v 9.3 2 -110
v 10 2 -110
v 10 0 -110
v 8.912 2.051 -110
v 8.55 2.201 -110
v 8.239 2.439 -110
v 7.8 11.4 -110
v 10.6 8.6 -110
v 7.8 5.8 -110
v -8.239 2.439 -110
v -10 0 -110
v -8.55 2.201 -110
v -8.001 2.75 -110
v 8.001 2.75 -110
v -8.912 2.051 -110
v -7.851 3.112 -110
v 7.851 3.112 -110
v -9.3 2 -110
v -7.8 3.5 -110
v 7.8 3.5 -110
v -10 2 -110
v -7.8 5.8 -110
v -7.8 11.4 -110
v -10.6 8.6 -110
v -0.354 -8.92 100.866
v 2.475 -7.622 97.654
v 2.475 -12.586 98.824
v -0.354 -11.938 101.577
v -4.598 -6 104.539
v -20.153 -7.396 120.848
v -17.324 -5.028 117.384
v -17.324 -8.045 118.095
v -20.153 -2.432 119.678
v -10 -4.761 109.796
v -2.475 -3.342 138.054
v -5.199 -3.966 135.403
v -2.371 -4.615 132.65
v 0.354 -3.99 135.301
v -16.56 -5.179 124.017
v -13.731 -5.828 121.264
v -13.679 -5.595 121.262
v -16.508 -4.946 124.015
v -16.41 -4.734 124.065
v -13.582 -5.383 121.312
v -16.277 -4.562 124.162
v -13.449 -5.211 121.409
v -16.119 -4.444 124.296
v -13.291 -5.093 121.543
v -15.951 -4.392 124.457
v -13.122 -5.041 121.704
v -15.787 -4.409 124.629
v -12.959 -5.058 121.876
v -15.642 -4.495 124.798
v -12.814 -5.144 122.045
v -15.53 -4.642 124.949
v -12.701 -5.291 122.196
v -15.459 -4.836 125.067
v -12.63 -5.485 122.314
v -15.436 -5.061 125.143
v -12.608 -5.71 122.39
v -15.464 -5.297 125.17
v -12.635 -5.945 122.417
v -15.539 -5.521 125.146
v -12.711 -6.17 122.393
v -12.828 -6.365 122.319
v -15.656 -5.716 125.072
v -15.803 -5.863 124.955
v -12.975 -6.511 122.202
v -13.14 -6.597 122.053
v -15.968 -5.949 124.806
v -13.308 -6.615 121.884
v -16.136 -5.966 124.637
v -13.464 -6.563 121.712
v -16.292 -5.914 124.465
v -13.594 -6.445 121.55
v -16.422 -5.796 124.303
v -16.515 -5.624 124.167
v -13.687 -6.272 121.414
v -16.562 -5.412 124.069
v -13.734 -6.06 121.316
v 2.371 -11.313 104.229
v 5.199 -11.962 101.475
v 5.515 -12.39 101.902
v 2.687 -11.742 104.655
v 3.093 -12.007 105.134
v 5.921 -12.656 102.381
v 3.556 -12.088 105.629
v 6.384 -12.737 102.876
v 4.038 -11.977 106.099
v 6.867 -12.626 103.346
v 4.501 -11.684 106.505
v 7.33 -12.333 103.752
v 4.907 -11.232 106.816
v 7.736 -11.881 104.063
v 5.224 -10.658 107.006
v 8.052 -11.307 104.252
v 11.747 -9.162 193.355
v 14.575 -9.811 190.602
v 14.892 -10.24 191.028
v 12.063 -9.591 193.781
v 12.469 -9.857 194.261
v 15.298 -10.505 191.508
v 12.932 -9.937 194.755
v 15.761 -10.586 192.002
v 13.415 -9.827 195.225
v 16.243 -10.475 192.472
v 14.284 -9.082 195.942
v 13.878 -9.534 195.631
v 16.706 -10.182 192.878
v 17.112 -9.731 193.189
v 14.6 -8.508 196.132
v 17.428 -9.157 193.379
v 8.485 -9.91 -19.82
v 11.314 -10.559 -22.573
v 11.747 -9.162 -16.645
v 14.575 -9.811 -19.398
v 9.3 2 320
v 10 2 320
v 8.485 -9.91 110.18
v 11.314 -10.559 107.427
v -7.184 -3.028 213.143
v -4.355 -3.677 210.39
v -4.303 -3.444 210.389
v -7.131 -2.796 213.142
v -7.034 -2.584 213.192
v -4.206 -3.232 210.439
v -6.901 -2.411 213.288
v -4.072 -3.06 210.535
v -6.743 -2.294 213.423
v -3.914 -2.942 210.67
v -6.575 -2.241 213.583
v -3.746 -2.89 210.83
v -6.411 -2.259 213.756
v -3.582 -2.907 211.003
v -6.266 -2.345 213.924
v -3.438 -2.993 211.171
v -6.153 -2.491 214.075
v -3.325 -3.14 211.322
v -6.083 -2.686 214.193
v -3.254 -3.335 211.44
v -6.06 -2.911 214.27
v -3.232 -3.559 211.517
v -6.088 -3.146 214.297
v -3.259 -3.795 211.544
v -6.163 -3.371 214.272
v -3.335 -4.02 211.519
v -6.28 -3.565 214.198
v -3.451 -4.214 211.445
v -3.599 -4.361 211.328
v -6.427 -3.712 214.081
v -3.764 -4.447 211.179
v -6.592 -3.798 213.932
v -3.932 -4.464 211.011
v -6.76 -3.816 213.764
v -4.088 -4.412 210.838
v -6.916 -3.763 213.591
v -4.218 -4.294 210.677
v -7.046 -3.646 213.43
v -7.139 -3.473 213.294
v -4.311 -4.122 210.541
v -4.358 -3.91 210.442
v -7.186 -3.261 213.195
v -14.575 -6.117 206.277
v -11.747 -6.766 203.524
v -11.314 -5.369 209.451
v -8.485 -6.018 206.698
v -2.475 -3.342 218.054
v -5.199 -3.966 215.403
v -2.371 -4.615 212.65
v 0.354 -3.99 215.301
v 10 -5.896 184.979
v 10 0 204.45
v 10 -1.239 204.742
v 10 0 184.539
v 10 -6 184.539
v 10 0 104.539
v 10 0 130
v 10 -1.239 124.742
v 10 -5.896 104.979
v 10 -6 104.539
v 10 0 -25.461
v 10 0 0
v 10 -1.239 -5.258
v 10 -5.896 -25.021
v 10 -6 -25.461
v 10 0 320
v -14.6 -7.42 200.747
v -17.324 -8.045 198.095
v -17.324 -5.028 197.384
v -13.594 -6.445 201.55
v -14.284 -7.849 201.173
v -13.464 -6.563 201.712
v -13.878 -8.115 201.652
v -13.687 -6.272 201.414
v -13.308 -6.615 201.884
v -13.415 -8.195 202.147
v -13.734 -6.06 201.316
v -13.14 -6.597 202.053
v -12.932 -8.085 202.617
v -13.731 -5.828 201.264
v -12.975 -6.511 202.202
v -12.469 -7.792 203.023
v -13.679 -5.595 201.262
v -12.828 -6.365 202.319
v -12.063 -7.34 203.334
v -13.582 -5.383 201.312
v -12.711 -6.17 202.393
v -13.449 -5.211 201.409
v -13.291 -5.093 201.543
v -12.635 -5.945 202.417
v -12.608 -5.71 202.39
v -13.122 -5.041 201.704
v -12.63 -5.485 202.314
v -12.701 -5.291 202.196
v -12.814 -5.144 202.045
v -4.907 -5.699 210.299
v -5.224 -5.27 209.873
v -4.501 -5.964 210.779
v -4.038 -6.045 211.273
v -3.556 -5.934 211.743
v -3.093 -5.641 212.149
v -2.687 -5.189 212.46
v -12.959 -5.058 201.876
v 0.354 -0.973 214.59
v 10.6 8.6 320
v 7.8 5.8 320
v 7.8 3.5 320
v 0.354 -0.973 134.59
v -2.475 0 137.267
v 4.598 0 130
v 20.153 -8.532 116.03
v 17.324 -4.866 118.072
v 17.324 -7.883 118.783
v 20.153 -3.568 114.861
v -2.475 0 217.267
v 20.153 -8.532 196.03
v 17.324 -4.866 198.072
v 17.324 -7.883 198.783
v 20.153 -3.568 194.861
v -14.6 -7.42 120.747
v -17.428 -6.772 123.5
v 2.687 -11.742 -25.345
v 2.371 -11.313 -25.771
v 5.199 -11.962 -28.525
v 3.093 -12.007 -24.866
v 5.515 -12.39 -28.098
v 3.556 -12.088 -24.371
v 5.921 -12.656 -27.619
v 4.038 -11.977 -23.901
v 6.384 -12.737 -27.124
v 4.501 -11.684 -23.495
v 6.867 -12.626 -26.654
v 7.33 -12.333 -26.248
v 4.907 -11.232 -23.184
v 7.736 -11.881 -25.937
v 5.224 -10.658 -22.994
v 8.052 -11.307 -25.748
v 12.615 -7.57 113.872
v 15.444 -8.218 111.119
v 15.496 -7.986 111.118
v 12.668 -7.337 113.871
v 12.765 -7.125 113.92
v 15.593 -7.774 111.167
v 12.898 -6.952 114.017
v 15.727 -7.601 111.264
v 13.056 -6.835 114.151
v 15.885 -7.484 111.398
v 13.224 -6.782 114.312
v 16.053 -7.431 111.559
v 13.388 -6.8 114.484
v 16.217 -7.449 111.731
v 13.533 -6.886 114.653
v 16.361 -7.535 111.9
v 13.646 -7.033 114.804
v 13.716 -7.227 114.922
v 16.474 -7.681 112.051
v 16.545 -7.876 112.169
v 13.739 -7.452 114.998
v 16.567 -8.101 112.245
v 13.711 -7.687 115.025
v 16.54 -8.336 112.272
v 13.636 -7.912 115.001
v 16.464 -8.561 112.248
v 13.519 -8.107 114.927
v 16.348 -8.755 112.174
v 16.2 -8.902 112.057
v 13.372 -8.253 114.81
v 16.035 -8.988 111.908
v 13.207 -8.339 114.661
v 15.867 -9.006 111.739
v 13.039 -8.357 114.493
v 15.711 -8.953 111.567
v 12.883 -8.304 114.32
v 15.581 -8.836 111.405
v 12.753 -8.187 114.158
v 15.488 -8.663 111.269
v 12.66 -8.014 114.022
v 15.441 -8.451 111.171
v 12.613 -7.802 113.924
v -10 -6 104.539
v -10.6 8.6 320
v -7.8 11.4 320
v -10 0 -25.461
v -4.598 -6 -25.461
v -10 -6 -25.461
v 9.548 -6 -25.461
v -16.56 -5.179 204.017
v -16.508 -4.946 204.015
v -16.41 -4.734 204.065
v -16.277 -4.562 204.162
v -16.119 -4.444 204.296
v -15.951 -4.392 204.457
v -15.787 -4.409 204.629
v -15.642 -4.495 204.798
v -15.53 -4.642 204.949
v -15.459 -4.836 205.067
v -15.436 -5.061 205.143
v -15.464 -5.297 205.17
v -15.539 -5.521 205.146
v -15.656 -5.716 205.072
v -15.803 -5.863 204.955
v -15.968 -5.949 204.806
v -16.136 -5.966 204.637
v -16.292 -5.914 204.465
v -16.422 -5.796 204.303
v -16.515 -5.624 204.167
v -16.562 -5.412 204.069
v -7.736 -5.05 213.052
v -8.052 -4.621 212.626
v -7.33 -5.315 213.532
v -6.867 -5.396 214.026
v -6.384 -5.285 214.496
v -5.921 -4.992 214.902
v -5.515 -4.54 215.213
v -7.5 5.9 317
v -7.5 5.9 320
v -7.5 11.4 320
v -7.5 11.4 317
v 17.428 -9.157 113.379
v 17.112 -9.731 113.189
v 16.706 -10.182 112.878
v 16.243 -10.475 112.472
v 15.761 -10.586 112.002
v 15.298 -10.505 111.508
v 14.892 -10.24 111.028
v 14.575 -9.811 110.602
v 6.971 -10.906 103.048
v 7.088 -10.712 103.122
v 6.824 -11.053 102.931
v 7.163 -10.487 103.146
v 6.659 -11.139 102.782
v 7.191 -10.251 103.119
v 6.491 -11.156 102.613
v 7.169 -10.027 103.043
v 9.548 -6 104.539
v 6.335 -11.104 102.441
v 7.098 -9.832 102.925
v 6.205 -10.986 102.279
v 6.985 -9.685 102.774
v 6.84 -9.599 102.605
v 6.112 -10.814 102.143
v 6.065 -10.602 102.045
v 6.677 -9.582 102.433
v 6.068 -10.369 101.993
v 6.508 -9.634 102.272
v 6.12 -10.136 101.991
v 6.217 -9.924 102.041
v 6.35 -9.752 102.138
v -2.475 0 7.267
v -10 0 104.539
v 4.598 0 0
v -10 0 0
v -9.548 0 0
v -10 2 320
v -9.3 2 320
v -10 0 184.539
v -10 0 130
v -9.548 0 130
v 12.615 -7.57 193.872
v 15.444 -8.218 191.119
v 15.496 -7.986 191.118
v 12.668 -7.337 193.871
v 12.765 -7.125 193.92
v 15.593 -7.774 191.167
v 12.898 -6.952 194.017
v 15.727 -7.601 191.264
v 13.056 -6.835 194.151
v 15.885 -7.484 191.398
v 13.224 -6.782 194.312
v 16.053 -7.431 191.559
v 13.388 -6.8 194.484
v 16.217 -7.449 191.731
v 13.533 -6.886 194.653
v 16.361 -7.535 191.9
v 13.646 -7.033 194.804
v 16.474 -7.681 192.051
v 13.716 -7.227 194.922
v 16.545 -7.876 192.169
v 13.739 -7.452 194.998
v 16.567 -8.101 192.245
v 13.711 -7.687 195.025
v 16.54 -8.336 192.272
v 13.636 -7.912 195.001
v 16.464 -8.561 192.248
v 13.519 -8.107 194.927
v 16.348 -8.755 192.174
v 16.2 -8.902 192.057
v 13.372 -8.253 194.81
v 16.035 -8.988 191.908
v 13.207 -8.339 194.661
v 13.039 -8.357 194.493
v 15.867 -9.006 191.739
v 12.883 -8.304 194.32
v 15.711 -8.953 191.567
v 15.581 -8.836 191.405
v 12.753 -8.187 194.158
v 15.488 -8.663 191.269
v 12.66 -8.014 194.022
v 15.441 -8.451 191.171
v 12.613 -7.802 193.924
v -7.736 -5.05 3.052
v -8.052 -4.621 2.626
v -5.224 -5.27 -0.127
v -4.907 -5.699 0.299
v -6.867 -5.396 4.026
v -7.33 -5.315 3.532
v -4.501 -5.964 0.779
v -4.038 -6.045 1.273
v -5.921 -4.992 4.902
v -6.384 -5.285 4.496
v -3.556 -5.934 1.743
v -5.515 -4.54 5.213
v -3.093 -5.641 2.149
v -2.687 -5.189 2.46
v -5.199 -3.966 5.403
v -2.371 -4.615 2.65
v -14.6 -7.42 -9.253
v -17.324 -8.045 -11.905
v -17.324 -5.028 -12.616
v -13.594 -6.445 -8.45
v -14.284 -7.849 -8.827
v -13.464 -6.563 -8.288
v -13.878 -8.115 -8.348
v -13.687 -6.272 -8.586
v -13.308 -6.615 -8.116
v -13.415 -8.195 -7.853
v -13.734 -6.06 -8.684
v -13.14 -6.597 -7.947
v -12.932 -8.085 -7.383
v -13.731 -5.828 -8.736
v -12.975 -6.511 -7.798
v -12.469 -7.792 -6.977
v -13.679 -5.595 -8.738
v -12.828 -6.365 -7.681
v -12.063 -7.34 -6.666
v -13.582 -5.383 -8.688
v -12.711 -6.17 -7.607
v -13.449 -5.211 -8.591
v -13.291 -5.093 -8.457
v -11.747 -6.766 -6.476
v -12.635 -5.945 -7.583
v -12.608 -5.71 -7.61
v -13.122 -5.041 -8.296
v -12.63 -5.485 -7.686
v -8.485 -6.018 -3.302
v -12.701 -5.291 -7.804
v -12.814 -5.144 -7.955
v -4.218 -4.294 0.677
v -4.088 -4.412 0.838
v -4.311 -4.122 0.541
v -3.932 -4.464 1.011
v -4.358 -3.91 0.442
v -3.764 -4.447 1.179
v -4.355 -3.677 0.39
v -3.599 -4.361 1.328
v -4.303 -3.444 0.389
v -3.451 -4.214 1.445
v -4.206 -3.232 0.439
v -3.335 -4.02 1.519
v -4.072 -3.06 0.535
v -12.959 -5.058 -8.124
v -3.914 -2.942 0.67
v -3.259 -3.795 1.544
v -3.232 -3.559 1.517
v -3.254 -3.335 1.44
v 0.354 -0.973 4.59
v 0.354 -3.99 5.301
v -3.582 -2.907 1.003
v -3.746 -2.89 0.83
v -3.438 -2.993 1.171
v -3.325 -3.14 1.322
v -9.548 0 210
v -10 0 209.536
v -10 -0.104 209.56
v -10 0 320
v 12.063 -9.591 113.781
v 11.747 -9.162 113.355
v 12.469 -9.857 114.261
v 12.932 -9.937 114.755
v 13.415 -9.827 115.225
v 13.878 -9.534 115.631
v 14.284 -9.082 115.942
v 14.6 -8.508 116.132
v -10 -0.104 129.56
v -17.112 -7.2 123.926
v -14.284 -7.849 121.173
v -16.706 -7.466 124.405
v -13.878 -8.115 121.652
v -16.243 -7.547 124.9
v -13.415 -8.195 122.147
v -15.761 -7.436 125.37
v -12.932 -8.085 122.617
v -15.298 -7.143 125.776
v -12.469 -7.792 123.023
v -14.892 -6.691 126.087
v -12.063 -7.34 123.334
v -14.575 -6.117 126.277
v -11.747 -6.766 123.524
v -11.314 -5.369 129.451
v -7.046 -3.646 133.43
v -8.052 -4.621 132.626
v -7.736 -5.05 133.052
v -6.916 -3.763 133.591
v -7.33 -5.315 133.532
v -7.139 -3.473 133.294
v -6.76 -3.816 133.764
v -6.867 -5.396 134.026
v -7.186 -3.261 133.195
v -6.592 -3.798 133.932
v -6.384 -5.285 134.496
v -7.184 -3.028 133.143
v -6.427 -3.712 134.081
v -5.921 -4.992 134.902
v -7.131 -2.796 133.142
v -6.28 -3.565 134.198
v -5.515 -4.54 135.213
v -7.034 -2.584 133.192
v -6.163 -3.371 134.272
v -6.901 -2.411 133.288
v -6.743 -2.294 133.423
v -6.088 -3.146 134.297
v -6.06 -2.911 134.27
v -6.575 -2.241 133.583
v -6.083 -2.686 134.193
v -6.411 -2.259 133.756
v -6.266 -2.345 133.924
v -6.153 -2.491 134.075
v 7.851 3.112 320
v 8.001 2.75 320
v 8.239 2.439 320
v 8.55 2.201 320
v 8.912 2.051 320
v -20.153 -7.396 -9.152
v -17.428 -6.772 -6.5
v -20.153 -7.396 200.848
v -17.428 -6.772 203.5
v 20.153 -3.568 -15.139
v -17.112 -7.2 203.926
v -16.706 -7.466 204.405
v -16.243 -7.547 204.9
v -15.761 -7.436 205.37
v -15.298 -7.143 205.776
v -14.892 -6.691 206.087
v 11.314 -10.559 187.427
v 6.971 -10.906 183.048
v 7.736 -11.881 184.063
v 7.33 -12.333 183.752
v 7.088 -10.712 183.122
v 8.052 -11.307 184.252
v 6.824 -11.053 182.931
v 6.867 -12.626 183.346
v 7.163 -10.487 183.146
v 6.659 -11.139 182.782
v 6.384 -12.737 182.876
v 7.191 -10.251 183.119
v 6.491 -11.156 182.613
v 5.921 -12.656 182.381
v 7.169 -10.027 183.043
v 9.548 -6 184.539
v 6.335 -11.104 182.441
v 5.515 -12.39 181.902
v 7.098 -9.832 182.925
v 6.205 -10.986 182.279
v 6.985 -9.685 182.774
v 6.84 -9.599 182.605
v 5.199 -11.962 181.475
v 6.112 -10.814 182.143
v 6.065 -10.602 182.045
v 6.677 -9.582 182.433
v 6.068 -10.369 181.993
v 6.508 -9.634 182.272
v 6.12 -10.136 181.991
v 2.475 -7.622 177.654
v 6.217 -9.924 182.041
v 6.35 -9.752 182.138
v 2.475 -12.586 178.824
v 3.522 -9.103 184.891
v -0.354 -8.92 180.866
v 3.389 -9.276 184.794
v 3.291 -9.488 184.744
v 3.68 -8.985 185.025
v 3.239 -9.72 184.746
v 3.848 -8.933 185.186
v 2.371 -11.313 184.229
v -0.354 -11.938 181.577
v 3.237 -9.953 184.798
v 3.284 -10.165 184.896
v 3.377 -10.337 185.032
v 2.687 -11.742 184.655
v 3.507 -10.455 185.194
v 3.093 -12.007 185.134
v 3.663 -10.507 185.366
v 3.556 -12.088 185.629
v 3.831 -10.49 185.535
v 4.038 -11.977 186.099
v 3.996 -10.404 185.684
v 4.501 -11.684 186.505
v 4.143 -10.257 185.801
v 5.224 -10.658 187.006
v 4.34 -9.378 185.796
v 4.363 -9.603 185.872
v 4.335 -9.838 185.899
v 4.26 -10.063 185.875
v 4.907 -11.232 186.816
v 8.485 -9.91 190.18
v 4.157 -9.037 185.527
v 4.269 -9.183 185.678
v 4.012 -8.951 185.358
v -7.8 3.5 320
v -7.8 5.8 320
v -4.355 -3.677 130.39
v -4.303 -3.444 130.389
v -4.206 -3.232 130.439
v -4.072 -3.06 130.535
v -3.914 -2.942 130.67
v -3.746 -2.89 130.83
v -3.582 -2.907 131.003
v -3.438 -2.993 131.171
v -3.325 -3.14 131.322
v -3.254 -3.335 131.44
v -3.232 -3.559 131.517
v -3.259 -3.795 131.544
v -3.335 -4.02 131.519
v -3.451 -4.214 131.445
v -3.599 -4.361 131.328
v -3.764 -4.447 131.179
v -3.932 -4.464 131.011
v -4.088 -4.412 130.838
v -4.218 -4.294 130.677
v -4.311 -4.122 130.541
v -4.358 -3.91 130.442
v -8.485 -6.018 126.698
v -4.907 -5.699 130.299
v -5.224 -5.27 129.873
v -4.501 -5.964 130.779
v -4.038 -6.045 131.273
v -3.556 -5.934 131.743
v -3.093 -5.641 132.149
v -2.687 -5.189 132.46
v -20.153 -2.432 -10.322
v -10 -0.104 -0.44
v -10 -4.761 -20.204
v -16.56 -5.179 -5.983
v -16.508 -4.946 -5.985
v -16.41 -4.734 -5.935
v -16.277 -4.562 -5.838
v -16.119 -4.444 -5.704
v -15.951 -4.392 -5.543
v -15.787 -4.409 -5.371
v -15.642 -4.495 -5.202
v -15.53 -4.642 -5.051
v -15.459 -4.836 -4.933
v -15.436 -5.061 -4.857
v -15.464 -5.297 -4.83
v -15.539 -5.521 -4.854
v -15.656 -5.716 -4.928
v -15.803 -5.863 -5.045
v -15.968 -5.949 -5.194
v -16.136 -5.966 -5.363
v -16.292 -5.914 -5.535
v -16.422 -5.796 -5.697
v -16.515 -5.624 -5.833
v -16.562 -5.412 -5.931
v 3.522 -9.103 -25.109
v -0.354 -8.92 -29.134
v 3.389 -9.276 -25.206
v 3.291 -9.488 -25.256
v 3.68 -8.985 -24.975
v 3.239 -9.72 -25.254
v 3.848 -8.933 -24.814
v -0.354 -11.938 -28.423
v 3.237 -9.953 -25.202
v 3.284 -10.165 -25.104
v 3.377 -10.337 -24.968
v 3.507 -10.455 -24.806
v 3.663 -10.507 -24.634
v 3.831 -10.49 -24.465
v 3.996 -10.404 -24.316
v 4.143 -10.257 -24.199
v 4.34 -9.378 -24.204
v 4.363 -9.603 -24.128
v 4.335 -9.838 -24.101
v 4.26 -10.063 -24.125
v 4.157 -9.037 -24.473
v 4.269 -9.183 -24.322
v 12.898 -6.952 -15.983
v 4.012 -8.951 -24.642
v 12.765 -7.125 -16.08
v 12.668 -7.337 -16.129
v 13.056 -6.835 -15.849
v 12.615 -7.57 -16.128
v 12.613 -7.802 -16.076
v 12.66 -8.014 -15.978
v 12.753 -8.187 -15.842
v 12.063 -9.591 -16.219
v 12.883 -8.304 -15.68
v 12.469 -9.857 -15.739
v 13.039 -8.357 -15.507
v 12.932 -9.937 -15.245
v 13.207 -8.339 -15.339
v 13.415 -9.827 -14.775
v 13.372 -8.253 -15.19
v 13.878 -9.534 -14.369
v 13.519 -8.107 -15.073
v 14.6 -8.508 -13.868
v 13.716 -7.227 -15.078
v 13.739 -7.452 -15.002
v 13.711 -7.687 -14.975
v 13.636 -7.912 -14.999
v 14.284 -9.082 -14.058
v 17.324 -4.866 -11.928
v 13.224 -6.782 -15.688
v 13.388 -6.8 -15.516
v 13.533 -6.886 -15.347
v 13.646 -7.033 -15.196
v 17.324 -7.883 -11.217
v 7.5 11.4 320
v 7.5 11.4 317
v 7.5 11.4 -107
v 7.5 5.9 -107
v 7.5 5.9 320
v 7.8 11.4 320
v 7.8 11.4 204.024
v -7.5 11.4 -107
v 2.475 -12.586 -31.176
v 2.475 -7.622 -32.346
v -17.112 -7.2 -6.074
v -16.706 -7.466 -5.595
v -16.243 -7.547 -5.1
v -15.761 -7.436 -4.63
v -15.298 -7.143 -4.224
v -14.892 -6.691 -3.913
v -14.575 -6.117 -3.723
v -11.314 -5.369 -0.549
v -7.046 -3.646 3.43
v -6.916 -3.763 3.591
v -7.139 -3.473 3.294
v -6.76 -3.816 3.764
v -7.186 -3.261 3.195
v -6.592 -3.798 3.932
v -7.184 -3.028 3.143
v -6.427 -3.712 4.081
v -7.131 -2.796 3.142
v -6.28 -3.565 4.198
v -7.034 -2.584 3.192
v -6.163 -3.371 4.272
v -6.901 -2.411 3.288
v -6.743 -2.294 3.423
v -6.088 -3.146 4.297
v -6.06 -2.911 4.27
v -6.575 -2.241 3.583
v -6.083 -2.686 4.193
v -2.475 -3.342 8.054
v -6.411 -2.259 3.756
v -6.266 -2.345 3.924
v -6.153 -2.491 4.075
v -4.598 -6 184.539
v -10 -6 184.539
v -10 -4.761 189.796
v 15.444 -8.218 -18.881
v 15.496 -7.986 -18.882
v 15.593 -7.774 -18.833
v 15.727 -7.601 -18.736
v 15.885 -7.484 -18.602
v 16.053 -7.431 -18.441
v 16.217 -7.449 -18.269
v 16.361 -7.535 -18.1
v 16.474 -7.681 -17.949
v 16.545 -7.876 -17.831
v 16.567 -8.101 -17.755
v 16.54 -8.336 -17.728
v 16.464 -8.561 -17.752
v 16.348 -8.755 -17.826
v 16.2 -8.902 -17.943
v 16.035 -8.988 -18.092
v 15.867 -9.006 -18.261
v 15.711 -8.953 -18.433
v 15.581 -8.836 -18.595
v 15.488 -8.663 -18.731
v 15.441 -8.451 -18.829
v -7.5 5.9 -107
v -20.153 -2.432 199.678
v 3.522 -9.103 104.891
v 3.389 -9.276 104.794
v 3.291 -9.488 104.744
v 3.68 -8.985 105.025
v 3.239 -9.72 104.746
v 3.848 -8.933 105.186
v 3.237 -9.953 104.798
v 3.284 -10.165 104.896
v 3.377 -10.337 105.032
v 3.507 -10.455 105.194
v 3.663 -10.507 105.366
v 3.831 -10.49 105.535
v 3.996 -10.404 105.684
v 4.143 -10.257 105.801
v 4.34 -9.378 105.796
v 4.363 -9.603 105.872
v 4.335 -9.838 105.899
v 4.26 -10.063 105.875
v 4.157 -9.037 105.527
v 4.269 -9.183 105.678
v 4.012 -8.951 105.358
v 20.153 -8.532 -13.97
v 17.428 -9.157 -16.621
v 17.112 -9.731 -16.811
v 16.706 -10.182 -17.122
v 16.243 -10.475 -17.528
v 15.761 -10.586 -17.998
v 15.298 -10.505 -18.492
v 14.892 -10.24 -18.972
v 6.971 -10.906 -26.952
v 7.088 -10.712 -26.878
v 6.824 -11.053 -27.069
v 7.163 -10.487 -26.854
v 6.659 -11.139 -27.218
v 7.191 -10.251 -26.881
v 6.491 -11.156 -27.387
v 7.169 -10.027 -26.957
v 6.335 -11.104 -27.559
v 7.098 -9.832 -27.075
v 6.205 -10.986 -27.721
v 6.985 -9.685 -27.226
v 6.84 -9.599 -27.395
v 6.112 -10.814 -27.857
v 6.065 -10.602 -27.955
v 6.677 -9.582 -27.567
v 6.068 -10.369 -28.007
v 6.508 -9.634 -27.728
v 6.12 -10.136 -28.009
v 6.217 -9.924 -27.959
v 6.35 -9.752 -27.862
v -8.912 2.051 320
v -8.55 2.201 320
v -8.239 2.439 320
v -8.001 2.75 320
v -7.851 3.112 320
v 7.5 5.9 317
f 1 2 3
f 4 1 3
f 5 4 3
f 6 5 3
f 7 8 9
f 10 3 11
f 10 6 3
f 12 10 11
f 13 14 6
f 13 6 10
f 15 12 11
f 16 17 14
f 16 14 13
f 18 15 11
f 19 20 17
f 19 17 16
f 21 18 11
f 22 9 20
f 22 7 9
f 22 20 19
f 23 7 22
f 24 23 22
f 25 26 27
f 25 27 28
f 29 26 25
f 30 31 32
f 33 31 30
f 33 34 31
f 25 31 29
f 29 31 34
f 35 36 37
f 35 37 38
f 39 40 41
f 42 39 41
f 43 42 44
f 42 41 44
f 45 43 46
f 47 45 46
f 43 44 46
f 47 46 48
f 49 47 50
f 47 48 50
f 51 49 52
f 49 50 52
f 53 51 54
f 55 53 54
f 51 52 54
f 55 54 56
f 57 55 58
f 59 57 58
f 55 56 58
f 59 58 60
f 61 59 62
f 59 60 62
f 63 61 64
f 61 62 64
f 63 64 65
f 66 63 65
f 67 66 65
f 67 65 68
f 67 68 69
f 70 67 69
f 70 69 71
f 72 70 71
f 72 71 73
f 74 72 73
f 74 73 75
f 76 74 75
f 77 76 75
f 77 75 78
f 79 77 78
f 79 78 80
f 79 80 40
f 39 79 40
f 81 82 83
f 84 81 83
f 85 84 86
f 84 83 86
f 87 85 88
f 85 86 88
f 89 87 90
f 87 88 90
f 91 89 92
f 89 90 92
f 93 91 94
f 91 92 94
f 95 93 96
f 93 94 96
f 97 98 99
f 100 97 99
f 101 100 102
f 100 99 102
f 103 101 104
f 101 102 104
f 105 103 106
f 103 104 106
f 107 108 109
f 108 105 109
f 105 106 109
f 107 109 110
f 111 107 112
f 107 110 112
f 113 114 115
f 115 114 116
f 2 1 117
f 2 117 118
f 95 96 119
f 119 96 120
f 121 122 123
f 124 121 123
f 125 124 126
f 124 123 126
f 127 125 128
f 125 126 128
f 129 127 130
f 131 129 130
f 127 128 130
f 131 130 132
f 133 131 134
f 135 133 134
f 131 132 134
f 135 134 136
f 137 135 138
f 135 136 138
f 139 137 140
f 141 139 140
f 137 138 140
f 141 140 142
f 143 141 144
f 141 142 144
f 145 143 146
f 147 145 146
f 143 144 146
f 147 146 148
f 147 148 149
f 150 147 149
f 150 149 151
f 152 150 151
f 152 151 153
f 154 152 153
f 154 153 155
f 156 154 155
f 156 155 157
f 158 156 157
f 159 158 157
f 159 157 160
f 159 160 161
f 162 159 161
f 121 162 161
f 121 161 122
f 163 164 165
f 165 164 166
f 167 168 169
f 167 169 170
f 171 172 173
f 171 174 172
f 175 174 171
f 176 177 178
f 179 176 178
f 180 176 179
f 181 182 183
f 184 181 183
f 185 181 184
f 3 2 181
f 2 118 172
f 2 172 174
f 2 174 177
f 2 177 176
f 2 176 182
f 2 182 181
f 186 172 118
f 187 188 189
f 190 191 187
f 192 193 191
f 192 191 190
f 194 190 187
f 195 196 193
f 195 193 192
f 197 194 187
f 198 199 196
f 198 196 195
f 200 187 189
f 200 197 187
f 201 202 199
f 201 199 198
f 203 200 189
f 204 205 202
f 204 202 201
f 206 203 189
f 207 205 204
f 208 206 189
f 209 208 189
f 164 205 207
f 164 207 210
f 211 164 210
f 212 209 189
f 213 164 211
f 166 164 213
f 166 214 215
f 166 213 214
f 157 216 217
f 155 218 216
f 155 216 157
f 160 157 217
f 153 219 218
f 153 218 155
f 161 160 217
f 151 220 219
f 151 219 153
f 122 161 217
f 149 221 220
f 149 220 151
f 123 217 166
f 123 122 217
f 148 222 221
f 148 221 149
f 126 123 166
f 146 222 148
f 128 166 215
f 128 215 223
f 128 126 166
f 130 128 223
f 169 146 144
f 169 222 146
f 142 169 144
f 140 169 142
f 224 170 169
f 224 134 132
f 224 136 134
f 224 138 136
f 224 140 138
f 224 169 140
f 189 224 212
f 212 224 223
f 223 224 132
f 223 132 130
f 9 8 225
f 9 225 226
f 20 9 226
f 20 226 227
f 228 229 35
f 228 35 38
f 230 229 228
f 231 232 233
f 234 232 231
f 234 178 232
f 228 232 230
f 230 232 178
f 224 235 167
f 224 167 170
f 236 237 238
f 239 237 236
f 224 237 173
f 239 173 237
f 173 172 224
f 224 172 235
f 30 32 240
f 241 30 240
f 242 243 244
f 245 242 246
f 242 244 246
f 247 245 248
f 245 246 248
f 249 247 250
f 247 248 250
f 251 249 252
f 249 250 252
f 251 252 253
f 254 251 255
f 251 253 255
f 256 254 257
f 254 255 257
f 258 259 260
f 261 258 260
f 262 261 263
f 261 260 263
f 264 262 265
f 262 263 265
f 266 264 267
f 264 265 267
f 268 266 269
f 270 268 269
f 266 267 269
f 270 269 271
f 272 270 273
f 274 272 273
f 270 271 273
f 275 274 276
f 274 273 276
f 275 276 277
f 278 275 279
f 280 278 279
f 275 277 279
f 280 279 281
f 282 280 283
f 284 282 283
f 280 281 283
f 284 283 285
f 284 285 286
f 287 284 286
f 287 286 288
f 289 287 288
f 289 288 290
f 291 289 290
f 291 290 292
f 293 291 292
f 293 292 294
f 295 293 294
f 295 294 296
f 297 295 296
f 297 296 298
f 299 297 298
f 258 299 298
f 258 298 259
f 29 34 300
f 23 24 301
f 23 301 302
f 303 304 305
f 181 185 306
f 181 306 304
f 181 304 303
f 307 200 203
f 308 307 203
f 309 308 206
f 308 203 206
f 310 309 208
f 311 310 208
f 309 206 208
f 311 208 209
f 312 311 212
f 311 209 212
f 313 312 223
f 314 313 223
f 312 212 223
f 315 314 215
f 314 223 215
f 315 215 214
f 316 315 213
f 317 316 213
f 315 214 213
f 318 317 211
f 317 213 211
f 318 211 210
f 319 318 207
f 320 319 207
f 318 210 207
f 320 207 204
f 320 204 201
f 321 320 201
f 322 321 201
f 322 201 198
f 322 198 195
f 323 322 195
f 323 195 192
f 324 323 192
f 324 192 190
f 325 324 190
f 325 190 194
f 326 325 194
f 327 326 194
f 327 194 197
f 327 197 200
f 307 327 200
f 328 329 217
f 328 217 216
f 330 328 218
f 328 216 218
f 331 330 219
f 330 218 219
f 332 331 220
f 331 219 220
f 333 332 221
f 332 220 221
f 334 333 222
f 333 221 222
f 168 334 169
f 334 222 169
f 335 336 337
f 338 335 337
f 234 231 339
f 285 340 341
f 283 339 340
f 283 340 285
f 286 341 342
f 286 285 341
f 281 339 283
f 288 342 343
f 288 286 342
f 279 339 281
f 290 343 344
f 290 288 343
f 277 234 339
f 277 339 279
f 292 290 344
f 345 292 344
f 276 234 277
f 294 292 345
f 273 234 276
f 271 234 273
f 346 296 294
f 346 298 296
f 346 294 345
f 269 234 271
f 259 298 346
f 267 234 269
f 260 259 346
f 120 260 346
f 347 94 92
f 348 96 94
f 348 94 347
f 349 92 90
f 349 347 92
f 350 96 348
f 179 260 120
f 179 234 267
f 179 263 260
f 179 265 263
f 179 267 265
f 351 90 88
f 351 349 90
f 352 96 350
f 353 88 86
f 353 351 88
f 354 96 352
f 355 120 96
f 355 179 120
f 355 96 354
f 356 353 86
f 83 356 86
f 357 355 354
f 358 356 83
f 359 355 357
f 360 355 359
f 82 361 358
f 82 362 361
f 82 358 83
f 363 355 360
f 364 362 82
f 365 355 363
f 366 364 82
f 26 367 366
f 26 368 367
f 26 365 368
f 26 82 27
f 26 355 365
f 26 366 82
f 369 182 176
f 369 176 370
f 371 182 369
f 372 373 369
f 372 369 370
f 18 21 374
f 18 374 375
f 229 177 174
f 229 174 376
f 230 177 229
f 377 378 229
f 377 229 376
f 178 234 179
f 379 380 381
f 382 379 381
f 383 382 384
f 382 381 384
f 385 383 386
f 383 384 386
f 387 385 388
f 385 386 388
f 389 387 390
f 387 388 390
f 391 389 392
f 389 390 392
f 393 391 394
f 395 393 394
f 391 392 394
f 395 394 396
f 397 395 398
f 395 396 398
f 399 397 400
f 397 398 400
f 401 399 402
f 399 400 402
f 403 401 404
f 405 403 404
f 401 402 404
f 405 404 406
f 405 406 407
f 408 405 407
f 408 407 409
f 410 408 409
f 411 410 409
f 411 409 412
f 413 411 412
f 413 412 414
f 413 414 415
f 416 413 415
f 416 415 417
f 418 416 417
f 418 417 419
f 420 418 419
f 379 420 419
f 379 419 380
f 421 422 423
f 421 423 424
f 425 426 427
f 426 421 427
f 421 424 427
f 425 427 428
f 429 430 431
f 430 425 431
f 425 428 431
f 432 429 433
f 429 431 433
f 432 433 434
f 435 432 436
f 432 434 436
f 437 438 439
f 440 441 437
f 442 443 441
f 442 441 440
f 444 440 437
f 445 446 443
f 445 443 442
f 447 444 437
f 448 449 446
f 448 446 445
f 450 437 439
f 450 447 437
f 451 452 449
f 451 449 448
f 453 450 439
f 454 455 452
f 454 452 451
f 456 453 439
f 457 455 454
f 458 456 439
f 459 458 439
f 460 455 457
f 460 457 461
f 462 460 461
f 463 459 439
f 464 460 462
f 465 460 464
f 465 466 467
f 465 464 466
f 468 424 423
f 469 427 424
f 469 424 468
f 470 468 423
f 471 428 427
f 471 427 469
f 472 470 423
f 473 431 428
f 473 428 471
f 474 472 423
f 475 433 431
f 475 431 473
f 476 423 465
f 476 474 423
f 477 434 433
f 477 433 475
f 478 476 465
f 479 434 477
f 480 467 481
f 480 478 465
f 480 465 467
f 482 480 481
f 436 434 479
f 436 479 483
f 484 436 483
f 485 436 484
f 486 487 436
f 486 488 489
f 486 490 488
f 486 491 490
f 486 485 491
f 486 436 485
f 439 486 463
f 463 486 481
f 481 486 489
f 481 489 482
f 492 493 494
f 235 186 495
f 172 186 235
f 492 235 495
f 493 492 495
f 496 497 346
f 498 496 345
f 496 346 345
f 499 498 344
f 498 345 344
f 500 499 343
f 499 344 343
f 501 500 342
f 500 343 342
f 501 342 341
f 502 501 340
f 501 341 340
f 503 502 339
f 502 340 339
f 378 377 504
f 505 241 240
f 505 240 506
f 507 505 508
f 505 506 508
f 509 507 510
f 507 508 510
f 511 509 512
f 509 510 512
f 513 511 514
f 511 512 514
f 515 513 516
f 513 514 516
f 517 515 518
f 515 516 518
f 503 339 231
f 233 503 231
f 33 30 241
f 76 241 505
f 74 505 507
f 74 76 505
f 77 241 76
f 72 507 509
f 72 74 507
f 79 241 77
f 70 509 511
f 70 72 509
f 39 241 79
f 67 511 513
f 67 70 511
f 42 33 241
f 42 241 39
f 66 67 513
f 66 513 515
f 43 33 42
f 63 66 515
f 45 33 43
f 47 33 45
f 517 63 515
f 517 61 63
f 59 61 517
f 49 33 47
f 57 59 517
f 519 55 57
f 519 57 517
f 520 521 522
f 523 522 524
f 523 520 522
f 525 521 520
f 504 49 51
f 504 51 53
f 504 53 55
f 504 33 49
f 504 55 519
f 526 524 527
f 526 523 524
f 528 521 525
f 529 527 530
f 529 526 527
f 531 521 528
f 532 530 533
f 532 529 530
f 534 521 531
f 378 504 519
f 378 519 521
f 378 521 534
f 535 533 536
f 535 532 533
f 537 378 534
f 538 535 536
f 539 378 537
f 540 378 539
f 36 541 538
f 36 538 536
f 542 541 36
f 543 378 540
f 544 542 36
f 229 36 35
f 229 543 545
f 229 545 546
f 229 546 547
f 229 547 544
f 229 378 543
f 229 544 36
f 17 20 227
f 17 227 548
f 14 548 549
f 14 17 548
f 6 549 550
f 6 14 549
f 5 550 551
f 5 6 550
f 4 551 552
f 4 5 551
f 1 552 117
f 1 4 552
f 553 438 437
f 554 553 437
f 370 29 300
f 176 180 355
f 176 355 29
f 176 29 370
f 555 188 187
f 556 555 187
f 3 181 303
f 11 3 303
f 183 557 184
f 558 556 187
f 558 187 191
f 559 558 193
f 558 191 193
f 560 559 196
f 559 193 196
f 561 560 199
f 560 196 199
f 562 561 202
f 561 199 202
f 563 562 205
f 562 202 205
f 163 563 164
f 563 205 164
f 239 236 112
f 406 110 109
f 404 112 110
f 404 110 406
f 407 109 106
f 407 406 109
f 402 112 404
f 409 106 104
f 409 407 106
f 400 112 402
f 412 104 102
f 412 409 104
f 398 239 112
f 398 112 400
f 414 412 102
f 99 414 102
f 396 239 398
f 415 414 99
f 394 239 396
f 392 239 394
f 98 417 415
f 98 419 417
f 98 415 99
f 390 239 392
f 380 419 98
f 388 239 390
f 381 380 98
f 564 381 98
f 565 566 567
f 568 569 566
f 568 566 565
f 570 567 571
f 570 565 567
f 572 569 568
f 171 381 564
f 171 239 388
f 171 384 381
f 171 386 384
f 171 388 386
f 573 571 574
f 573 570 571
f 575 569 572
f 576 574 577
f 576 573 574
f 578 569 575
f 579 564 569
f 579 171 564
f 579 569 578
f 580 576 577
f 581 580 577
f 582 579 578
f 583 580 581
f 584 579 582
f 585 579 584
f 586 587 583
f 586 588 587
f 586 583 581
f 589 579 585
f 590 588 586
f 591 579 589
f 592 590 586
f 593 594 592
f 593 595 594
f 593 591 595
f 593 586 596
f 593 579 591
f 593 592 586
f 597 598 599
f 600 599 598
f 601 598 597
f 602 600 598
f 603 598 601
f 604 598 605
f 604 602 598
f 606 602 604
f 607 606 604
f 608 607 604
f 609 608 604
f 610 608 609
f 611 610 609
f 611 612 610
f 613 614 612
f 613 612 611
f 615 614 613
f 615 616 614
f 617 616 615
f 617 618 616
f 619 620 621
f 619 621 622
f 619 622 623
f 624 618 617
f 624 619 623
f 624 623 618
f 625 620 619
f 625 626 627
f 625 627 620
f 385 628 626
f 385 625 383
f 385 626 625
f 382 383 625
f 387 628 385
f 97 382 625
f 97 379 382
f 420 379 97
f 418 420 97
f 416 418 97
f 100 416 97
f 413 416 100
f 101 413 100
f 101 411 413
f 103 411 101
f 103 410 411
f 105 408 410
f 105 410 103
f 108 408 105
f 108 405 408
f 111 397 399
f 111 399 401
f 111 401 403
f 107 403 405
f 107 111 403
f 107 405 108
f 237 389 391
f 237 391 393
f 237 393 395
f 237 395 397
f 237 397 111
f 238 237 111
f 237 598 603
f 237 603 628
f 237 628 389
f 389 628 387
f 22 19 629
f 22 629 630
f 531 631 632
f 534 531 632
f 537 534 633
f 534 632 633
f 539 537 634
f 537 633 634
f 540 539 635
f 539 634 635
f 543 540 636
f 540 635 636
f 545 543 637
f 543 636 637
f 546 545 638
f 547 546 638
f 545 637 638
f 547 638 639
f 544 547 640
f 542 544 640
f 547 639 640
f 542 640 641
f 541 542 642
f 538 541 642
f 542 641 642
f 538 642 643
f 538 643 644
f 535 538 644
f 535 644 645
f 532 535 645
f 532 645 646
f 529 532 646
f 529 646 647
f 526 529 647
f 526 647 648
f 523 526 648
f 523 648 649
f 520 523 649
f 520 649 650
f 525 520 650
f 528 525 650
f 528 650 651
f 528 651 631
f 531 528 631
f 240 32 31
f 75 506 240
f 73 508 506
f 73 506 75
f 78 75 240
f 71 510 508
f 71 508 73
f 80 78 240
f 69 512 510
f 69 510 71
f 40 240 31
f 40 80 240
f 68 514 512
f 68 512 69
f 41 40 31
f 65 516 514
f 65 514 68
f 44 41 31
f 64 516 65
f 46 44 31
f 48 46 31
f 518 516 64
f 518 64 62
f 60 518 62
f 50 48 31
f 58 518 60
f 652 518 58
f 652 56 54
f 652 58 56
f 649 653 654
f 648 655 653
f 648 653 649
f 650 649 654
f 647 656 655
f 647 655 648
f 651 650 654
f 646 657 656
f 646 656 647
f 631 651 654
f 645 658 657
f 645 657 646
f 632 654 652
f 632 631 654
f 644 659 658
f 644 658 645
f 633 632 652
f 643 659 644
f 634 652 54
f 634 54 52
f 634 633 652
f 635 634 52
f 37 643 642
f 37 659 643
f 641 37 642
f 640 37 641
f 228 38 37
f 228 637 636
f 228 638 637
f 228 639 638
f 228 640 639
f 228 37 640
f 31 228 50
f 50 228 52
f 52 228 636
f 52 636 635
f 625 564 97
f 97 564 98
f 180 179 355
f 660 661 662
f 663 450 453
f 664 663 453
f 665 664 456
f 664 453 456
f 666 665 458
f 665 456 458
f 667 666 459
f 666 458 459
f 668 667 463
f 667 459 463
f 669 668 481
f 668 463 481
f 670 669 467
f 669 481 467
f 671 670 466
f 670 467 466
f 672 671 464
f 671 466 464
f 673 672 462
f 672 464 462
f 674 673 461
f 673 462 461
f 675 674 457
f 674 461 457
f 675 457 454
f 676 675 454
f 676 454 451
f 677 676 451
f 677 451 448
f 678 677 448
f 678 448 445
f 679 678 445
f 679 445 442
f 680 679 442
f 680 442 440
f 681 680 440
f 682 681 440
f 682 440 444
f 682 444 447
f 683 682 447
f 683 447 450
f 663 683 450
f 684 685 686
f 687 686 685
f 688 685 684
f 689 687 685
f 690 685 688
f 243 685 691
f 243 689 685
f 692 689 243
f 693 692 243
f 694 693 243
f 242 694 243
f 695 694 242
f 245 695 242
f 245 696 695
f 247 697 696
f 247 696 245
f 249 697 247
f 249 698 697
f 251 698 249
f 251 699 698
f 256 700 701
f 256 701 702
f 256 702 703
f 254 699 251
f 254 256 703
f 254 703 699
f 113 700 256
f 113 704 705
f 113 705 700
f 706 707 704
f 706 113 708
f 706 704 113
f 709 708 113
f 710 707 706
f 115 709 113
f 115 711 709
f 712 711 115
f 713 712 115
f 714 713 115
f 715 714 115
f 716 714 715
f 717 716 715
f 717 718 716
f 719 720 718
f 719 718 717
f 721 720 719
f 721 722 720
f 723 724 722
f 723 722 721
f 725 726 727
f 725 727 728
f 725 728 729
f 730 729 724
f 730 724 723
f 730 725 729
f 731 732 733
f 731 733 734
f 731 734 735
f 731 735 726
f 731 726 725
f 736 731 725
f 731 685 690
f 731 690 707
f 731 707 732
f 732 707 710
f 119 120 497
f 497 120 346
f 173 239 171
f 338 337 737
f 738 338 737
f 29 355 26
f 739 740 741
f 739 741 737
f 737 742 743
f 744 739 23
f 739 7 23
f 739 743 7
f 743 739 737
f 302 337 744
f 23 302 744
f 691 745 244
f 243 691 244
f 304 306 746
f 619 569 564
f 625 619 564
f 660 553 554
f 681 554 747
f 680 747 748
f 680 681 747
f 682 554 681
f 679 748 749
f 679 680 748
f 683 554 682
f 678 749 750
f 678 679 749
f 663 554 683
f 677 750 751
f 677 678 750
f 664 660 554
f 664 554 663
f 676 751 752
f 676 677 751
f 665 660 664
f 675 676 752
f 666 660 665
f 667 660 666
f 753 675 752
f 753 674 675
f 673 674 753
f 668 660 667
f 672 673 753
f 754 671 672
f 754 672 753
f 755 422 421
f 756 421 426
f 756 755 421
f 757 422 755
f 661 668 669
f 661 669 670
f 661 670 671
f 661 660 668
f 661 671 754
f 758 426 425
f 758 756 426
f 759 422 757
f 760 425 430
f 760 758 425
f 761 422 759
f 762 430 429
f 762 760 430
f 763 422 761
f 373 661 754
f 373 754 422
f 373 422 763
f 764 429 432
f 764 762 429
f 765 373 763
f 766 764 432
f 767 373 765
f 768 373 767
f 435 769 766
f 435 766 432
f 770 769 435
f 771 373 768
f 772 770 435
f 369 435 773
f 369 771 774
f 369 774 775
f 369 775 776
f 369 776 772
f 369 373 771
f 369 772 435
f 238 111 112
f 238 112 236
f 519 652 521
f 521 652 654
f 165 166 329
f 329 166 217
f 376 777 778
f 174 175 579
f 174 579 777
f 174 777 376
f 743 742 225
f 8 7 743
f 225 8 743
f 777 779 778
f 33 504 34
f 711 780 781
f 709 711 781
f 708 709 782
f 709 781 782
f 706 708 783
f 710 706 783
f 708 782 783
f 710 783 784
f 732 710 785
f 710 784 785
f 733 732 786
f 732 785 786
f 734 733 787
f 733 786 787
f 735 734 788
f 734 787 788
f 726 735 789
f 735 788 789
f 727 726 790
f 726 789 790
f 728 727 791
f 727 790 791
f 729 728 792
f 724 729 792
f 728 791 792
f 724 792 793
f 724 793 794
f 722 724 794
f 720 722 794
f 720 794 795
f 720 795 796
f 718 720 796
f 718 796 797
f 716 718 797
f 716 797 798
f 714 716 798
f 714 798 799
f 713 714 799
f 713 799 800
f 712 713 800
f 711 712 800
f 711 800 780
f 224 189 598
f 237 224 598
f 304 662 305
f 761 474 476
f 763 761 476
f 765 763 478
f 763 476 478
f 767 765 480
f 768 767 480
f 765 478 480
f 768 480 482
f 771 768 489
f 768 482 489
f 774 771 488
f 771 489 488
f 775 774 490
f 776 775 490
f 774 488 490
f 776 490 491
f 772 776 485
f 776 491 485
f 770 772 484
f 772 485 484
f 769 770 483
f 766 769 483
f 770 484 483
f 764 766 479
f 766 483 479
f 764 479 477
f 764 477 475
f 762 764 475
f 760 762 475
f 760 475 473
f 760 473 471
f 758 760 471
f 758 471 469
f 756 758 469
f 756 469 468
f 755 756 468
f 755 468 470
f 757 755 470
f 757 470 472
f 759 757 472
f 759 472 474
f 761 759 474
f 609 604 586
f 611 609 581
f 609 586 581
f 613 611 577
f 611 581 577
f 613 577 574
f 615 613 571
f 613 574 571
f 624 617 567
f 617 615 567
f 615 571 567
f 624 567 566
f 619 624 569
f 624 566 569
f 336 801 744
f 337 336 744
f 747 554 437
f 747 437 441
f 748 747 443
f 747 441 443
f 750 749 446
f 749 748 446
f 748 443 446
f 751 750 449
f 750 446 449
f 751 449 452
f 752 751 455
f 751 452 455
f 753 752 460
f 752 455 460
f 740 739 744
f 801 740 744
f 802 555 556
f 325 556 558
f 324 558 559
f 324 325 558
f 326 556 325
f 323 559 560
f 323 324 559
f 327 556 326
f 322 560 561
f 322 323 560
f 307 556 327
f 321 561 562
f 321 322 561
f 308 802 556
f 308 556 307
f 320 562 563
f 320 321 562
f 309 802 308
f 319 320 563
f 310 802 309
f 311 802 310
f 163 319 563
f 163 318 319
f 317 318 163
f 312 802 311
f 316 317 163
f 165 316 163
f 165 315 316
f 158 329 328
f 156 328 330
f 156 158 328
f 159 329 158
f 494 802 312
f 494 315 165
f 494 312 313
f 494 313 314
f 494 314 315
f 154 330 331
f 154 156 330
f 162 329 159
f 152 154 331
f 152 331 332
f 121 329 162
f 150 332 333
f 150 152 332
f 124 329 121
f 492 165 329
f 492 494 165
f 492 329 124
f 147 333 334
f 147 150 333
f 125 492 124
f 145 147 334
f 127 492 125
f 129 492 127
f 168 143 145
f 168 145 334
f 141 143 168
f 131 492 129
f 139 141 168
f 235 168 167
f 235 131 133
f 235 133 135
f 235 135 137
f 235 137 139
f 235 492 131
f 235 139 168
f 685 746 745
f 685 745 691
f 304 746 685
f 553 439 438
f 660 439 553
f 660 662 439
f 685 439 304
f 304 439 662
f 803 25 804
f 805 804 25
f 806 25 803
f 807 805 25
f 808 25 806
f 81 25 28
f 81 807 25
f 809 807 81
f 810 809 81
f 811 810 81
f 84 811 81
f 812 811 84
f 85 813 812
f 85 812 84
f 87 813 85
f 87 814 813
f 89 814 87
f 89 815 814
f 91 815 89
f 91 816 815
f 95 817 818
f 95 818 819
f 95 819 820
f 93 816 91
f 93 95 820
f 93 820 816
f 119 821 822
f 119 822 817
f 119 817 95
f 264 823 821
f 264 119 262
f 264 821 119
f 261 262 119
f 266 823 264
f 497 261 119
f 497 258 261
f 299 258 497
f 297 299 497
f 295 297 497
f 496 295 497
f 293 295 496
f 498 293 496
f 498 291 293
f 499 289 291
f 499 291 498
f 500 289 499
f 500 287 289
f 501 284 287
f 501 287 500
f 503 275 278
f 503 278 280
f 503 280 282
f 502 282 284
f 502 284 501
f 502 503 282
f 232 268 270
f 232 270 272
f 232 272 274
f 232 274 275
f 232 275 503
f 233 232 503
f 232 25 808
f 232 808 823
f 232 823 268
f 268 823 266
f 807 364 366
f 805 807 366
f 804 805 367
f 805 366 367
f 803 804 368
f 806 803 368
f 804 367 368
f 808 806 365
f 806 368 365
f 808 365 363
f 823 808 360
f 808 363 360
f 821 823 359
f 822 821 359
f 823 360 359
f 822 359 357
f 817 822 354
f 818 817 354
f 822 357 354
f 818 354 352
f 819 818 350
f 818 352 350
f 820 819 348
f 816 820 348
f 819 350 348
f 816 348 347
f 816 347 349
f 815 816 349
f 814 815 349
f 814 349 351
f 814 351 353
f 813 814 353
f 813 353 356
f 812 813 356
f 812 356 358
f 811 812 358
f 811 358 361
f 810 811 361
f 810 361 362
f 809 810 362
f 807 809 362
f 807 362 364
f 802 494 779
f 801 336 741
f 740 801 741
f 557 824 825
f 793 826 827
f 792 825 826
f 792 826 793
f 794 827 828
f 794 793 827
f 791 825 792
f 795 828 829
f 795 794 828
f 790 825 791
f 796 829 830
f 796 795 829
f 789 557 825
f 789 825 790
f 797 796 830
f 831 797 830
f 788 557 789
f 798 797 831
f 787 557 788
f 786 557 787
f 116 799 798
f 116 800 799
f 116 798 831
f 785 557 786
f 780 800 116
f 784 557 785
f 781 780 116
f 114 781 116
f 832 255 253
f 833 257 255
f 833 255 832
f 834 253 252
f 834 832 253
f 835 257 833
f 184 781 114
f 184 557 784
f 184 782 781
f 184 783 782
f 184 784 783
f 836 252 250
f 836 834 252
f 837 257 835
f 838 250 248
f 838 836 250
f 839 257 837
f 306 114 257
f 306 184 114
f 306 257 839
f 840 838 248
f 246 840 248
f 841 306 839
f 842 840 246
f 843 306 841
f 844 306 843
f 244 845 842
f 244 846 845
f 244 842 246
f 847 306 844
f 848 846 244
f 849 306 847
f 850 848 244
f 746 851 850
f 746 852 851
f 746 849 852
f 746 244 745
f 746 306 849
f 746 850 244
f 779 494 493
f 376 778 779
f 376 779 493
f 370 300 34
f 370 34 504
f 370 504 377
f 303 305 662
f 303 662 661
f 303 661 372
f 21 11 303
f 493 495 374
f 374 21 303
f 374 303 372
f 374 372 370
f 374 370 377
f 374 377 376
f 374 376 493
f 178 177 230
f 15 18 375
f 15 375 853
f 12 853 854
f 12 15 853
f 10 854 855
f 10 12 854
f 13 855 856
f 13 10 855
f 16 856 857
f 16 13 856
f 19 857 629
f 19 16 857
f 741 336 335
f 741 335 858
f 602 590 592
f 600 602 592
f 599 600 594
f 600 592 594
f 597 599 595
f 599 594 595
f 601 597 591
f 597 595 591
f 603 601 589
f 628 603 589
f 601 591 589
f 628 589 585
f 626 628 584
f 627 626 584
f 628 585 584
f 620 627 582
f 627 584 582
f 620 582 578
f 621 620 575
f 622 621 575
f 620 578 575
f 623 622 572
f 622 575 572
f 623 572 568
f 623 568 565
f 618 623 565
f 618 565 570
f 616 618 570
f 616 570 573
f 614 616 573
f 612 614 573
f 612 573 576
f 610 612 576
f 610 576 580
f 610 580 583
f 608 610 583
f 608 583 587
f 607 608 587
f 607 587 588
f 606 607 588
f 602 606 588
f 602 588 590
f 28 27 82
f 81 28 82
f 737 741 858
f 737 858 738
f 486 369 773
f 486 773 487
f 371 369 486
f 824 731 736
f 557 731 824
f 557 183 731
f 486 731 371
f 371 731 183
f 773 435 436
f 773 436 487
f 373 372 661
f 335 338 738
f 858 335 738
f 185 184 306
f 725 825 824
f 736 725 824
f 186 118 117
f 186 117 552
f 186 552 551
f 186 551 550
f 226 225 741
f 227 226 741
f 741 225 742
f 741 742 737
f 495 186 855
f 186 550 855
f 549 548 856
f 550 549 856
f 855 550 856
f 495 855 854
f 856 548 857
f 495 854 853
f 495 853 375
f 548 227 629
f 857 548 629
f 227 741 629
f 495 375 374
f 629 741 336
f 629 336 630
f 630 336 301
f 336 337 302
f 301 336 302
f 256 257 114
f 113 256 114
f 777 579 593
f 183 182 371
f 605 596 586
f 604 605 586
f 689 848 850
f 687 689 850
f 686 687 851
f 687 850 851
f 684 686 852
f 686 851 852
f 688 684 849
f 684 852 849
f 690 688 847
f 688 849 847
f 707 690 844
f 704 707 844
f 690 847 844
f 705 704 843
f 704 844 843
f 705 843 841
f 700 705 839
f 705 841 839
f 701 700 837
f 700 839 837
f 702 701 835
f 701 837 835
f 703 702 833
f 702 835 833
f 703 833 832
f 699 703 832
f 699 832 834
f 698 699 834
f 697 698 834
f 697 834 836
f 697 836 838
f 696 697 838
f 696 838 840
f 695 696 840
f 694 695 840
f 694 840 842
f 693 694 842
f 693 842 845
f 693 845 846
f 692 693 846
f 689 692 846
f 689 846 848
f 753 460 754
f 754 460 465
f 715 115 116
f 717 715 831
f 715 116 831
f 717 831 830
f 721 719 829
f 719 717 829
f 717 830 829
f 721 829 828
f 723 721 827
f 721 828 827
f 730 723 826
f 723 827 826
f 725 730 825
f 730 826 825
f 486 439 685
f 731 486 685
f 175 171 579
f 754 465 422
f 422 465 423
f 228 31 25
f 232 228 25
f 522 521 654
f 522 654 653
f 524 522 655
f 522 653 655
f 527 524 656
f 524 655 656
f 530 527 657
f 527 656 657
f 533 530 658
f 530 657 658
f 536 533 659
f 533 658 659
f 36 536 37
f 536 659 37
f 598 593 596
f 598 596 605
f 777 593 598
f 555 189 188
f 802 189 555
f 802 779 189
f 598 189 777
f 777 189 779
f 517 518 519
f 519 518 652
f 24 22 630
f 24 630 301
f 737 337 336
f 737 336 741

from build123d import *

# Parameters (mm, degrees)
EXTRUDE_1_DEPTH        = 230
EXTRUDE_4_DEPTH        = 20
EXTRUDE_5_DEPTH        = 7
CUT_EXTRUDE_2_DEPTH    = 183.949459984
SKETCH_13_R            = 0.8
CUT_EXTRUDE_3_DEPTH    = 185.21813585
CUT_EXTRUDE_START      = -19.466728686
CUT_EXTRUDE_4_DEPTH    = 17.054134169
PATTERN_LINEAR_1_COUNT = 2
PATTERN_LINEAR_1_PITCH = 80
EXTRUDE_START          = -110
EXTRUDE_6_DEPTH        = 110
EXTRUDE_7_DEPTH        = 320
SKETCH_14_W            = 15
SKETCH_14_H            = 5.5
CUT_EXTRUDE_5_DEPTH    = 431.660379744
SKETCH_15_W            = 15
SKETCH_15_H            = 5.5
EXTRUDE_8_DEPTH        = 3
SKETCH_16_W            = 15
SKETCH_16_H            = 5.5
EXTRUDE_9_DEPTH        = 3
PATTERN_LINEAR_2_COUNT = 2
PATTERN_LINEAR_2_PITCH = 210


# Read off the part's stored shape, not the designer's step: 切除-拉伸4
with BuildPart() as part:
    # 草图1 → 凸台-拉伸1 (new body)
    with BuildSketch(Plane.XY):
        with BuildLine():
            Line((10, 0), (-10, 0))
            Line((-10, 0), (-10, 2))
            Line((-10, 2), (-9.3, 2))
            ThreePointArc((-9.3, 2), (-8.239339828, 2.439339828), (-7.8, 3.5))
            Line((-7.8, 3.5), (-7.8, 5.8))
            Line((-7.8, 5.8), (-10.6, 8.6))
            Line((-10.6, 8.6), (-7.8, 11.4))
            Line((-7.8, 11.4), (7.8, 11.4))
            Line((7.8, 11.4), (10.6, 8.6))
            Line((10.6, 8.6), (7.8, 5.8))
            Line((7.8, 5.8), (7.8, 3.5))
            ThreePointArc((7.8, 3.5), (8.239339828, 2.439339828), (9.3, 2))
            Line((9.3, 2), (10, 2))
            Line((10, 2), (10, 0))
        make_face()
    extrude(amount=EXTRUDE_1_DEPTH)

    # 草图6 → 凸台-拉伸4 (add)
    with BuildSketch(Plane(origin=(10, 0, 0), x_dir=(0, 0, -1), z_dir=(1, 0, 0))):
        Polygon((-210, 0), (-184.538830434, -6), (-184.538830434, 0), align=None)
    extrude_4 = extrude(amount=-EXTRUDE_4_DEPTH)

    # 草图9 → 凸台-拉伸5 (add)
    with BuildSketch(Plane(origin=(0, -46.883568579, 11.04825176), x_dir=(1, 0, 0), z_dir=(0, -0.9733392406205545, 0.2293702741599314))):
        Polygon((-2.474873734, 211.474495246), (20.152543264, 188.847078248), (2.474873734, 171.169408719), (-20.152543264, 193.796825717), align=None)
    extrude_5 = extrude(amount=EXTRUDE_5_DEPTH)

    # 草图12 → 切除-拉伸2 (cut, through all)
    with BuildSketch(Plane(origin=(104.499810756, 23.969150243, 101.713766446), x_dir=(0.6708344230619809, 0.1538694755336464, -0.7254690629751898), z_dir=(0.7071067811865466, 0.16218927626110527, 0.6882547774377598))):
        Polygon((-157.172081563, -5.77097041), (-155.591240381, -1.027454714), (-132.82236504, -8.615492386), (-134.403206222, -13.359008082), align=None)
    cut_extrude_2 = extrude(amount=-CUT_EXTRUDE_2_DEPTH, mode=Mode.SUBTRACT)

    # 草图13 → 切除-拉伸3 (cut, through all)
    with BuildSketch(Plane(origin=(-84.347267492, 19.346755869, 82.098505289), x_dir=(-0.6708344230619789, 0.1538694755336449, -0.725469062975192), z_dir=(0.707106781186549, -0.16218927626110477, -0.6882547774377574))):
        with BuildLine():
            Line((-145.787643892, -9.564989246), (-145.186924243, -7.762453281))
            Line((-145.186924243, -7.762453281), (-149.562889479, -6.304103294))
            ThreePointArc((-149.562889479, -6.304103294), (-151.824611116, -6.709831328), (-153.390762633, -5.028412455))
            Line((-153.390762633, -5.028412455), (-157.045713483, -3.810350327))
            Line((-157.045713483, -3.810350327), (-157.646433132, -5.612886292))
            Line((-157.646433132, -5.612886292), (-145.787643892, -9.564989246))
        make_face()
        with BuildLine():
            Line((-140.810959007, -9.220803269), (-145.186924243, -7.762453281))
            Line((-145.186924243, -7.762453281), (-145.787643892, -9.564989246))
            Line((-145.787643892, -9.564989246), (-133.928854652, -13.5170922))
            Line((-133.928854652, -13.5170922), (-133.328135003, -11.714556236))
            Line((-133.328135003, -11.714556236), (-136.983085853, -10.496494108))
            ThreePointArc((-136.983085853, -10.496494108), (-139.24480749, -10.902222142), (-140.810959007, -9.220803269))
        make_face()
        with Locations(Location((-151.065807349, -4.432943794, 0), (0, 0, 351.029025291))):
            Circle(SKETCH_13_R)
        with Locations(Location((-138.486003723, -8.625334607, 0), (0, 0, 351.029025291))):
            Circle(SKETCH_13_R)
    cut_extrude_3 = extrude(amount=-CUT_EXTRUDE_3_DEPTH, mode=Mode.SUBTRACT)

    # 切除-拉伸4 outline → 切除-拉伸4 (cut)
    with BuildSketch(Plane(origin=(0, -53.696943263, 12.653843679), x_dir=(1, 0, 0), z_dir=(0, -0.9733392406205545, 0.2293702741599314)).offset(CUT_EXTRUDE_START)):
        Polygon((7.8, 201.199621512), (10, 198.999621512), (10.6, 198.399621512), (10.6, 225.840609701), (7.8, 226.482846468), (-7.8, 226.482846468), (-10.6, 225.840609701), (-10.6, 203.349368981), (-2.474873734, 211.474495246), align=None)
    extrude(amount=CUT_EXTRUDE_4_DEPTH, mode=Mode.SUBTRACT)

    # 阵列(线性)1: 凸台-拉伸4, 凸台-拉伸5, 切除-拉伸2, 切除-拉伸3 ×2
    with Locations(*[(0, 0, -i * PATTERN_LINEAR_1_PITCH) for i in range(1, PATTERN_LINEAR_1_COUNT)]):
        add(extrude_4)
        add(extrude_5)
        add(cut_extrude_2, mode=Mode.SUBTRACT)
        add(cut_extrude_3, mode=Mode.SUBTRACT)

    # 草图1<3> → 凸台-拉伸6 (add)
    with BuildSketch(Plane.XY.offset(EXTRUDE_START)):
        with BuildLine():
            Line((10, 0), (-10, 0))
            Line((-10, 0), (-10, 2))
            Line((-10, 2), (-9.3, 2))
            ThreePointArc((-9.3, 2), (-8.239339828, 2.439339828), (-7.8, 3.5))
            Line((-7.8, 3.5), (-7.8, 5.8))
            Line((-7.8, 5.8), (-10.6, 8.6))
            Line((-10.6, 8.6), (-7.8, 11.4))
            Line((-7.8, 11.4), (7.8, 11.4))
            Line((7.8, 11.4), (10.6, 8.6))
            Line((10.6, 8.6), (7.8, 5.8))
            Line((7.8, 5.8), (7.8, 3.5))
            ThreePointArc((7.8, 3.5), (8.239339828, 2.439339828), (9.3, 2))
            Line((9.3, 2), (10, 2))
            Line((10, 2), (10, 0))
        make_face()
    extrude(amount=EXTRUDE_6_DEPTH)

    # 草图1<4> → 凸台-拉伸7 (add)
    with BuildSketch(Plane.XY):
        with BuildLine():
            Line((10, 0), (-10, 0))
            Line((-10, 0), (-10, 2))
            Line((-10, 2), (-9.3, 2))
            ThreePointArc((-9.3, 2), (-8.239339828, 2.439339828), (-7.8, 3.5))
            Line((-7.8, 3.5), (-7.8, 5.8))
            Line((-7.8, 5.8), (-10.6, 8.6))
            Line((-10.6, 8.6), (-7.8, 11.4))
            Line((-7.8, 11.4), (7.8, 11.4))
            Line((7.8, 11.4), (10.6, 8.6))
            Line((10.6, 8.6), (7.8, 5.8))
            Line((7.8, 5.8), (7.8, 3.5))
            ThreePointArc((7.8, 3.5), (8.239339828, 2.439339828), (9.3, 2))
            Line((9.3, 2), (10, 2))
            Line((10, 2), (10, 0))
        make_face()
    extrude(amount=EXTRUDE_7_DEPTH)

    # 草图14 → 切除-拉伸5 (cut, through all)
    with BuildSketch(Plane.XY.offset(320)):
        with Locations((0, 8.65)):
            Rectangle(SKETCH_14_W, SKETCH_14_H)
    extrude(amount=-CUT_EXTRUDE_5_DEPTH, mode=Mode.SUBTRACT)

    # 草图15 → 凸台-拉伸8 (add)
    with BuildSketch(Plane(origin=(0, 0, -110), x_dir=(-1, 0, 0), z_dir=(0, 0, -1))):
        with Locations((0, 8.65)):
            Rectangle(SKETCH_15_W, SKETCH_15_H)
    extrude(amount=-EXTRUDE_8_DEPTH)

    # 阵列(线性)2: 凸台-拉伸4, 凸台-拉伸5, 切除-拉伸2, 切除-拉伸3 ×2
    with Locations(*[(0, 0, -i * PATTERN_LINEAR_2_PITCH) for i in range(1, PATTERN_LINEAR_2_COUNT)]):
        add(extrude_4)
        add(extrude_5)
        add(cut_extrude_2, mode=Mode.SUBTRACT)
        add(cut_extrude_3, mode=Mode.SUBTRACT)


with BuildPart() as body_2:
    # 草图16 → 凸台-拉伸9 (new body)
    with BuildSketch(Plane.XY.offset(320)):
        with Locations((0, 8.65)):
            Rectangle(SKETCH_16_W, SKETCH_16_H)
    extrude(amount=-EXTRUDE_9_DEPTH)


solid = Compound([part.part, body_2.part])
